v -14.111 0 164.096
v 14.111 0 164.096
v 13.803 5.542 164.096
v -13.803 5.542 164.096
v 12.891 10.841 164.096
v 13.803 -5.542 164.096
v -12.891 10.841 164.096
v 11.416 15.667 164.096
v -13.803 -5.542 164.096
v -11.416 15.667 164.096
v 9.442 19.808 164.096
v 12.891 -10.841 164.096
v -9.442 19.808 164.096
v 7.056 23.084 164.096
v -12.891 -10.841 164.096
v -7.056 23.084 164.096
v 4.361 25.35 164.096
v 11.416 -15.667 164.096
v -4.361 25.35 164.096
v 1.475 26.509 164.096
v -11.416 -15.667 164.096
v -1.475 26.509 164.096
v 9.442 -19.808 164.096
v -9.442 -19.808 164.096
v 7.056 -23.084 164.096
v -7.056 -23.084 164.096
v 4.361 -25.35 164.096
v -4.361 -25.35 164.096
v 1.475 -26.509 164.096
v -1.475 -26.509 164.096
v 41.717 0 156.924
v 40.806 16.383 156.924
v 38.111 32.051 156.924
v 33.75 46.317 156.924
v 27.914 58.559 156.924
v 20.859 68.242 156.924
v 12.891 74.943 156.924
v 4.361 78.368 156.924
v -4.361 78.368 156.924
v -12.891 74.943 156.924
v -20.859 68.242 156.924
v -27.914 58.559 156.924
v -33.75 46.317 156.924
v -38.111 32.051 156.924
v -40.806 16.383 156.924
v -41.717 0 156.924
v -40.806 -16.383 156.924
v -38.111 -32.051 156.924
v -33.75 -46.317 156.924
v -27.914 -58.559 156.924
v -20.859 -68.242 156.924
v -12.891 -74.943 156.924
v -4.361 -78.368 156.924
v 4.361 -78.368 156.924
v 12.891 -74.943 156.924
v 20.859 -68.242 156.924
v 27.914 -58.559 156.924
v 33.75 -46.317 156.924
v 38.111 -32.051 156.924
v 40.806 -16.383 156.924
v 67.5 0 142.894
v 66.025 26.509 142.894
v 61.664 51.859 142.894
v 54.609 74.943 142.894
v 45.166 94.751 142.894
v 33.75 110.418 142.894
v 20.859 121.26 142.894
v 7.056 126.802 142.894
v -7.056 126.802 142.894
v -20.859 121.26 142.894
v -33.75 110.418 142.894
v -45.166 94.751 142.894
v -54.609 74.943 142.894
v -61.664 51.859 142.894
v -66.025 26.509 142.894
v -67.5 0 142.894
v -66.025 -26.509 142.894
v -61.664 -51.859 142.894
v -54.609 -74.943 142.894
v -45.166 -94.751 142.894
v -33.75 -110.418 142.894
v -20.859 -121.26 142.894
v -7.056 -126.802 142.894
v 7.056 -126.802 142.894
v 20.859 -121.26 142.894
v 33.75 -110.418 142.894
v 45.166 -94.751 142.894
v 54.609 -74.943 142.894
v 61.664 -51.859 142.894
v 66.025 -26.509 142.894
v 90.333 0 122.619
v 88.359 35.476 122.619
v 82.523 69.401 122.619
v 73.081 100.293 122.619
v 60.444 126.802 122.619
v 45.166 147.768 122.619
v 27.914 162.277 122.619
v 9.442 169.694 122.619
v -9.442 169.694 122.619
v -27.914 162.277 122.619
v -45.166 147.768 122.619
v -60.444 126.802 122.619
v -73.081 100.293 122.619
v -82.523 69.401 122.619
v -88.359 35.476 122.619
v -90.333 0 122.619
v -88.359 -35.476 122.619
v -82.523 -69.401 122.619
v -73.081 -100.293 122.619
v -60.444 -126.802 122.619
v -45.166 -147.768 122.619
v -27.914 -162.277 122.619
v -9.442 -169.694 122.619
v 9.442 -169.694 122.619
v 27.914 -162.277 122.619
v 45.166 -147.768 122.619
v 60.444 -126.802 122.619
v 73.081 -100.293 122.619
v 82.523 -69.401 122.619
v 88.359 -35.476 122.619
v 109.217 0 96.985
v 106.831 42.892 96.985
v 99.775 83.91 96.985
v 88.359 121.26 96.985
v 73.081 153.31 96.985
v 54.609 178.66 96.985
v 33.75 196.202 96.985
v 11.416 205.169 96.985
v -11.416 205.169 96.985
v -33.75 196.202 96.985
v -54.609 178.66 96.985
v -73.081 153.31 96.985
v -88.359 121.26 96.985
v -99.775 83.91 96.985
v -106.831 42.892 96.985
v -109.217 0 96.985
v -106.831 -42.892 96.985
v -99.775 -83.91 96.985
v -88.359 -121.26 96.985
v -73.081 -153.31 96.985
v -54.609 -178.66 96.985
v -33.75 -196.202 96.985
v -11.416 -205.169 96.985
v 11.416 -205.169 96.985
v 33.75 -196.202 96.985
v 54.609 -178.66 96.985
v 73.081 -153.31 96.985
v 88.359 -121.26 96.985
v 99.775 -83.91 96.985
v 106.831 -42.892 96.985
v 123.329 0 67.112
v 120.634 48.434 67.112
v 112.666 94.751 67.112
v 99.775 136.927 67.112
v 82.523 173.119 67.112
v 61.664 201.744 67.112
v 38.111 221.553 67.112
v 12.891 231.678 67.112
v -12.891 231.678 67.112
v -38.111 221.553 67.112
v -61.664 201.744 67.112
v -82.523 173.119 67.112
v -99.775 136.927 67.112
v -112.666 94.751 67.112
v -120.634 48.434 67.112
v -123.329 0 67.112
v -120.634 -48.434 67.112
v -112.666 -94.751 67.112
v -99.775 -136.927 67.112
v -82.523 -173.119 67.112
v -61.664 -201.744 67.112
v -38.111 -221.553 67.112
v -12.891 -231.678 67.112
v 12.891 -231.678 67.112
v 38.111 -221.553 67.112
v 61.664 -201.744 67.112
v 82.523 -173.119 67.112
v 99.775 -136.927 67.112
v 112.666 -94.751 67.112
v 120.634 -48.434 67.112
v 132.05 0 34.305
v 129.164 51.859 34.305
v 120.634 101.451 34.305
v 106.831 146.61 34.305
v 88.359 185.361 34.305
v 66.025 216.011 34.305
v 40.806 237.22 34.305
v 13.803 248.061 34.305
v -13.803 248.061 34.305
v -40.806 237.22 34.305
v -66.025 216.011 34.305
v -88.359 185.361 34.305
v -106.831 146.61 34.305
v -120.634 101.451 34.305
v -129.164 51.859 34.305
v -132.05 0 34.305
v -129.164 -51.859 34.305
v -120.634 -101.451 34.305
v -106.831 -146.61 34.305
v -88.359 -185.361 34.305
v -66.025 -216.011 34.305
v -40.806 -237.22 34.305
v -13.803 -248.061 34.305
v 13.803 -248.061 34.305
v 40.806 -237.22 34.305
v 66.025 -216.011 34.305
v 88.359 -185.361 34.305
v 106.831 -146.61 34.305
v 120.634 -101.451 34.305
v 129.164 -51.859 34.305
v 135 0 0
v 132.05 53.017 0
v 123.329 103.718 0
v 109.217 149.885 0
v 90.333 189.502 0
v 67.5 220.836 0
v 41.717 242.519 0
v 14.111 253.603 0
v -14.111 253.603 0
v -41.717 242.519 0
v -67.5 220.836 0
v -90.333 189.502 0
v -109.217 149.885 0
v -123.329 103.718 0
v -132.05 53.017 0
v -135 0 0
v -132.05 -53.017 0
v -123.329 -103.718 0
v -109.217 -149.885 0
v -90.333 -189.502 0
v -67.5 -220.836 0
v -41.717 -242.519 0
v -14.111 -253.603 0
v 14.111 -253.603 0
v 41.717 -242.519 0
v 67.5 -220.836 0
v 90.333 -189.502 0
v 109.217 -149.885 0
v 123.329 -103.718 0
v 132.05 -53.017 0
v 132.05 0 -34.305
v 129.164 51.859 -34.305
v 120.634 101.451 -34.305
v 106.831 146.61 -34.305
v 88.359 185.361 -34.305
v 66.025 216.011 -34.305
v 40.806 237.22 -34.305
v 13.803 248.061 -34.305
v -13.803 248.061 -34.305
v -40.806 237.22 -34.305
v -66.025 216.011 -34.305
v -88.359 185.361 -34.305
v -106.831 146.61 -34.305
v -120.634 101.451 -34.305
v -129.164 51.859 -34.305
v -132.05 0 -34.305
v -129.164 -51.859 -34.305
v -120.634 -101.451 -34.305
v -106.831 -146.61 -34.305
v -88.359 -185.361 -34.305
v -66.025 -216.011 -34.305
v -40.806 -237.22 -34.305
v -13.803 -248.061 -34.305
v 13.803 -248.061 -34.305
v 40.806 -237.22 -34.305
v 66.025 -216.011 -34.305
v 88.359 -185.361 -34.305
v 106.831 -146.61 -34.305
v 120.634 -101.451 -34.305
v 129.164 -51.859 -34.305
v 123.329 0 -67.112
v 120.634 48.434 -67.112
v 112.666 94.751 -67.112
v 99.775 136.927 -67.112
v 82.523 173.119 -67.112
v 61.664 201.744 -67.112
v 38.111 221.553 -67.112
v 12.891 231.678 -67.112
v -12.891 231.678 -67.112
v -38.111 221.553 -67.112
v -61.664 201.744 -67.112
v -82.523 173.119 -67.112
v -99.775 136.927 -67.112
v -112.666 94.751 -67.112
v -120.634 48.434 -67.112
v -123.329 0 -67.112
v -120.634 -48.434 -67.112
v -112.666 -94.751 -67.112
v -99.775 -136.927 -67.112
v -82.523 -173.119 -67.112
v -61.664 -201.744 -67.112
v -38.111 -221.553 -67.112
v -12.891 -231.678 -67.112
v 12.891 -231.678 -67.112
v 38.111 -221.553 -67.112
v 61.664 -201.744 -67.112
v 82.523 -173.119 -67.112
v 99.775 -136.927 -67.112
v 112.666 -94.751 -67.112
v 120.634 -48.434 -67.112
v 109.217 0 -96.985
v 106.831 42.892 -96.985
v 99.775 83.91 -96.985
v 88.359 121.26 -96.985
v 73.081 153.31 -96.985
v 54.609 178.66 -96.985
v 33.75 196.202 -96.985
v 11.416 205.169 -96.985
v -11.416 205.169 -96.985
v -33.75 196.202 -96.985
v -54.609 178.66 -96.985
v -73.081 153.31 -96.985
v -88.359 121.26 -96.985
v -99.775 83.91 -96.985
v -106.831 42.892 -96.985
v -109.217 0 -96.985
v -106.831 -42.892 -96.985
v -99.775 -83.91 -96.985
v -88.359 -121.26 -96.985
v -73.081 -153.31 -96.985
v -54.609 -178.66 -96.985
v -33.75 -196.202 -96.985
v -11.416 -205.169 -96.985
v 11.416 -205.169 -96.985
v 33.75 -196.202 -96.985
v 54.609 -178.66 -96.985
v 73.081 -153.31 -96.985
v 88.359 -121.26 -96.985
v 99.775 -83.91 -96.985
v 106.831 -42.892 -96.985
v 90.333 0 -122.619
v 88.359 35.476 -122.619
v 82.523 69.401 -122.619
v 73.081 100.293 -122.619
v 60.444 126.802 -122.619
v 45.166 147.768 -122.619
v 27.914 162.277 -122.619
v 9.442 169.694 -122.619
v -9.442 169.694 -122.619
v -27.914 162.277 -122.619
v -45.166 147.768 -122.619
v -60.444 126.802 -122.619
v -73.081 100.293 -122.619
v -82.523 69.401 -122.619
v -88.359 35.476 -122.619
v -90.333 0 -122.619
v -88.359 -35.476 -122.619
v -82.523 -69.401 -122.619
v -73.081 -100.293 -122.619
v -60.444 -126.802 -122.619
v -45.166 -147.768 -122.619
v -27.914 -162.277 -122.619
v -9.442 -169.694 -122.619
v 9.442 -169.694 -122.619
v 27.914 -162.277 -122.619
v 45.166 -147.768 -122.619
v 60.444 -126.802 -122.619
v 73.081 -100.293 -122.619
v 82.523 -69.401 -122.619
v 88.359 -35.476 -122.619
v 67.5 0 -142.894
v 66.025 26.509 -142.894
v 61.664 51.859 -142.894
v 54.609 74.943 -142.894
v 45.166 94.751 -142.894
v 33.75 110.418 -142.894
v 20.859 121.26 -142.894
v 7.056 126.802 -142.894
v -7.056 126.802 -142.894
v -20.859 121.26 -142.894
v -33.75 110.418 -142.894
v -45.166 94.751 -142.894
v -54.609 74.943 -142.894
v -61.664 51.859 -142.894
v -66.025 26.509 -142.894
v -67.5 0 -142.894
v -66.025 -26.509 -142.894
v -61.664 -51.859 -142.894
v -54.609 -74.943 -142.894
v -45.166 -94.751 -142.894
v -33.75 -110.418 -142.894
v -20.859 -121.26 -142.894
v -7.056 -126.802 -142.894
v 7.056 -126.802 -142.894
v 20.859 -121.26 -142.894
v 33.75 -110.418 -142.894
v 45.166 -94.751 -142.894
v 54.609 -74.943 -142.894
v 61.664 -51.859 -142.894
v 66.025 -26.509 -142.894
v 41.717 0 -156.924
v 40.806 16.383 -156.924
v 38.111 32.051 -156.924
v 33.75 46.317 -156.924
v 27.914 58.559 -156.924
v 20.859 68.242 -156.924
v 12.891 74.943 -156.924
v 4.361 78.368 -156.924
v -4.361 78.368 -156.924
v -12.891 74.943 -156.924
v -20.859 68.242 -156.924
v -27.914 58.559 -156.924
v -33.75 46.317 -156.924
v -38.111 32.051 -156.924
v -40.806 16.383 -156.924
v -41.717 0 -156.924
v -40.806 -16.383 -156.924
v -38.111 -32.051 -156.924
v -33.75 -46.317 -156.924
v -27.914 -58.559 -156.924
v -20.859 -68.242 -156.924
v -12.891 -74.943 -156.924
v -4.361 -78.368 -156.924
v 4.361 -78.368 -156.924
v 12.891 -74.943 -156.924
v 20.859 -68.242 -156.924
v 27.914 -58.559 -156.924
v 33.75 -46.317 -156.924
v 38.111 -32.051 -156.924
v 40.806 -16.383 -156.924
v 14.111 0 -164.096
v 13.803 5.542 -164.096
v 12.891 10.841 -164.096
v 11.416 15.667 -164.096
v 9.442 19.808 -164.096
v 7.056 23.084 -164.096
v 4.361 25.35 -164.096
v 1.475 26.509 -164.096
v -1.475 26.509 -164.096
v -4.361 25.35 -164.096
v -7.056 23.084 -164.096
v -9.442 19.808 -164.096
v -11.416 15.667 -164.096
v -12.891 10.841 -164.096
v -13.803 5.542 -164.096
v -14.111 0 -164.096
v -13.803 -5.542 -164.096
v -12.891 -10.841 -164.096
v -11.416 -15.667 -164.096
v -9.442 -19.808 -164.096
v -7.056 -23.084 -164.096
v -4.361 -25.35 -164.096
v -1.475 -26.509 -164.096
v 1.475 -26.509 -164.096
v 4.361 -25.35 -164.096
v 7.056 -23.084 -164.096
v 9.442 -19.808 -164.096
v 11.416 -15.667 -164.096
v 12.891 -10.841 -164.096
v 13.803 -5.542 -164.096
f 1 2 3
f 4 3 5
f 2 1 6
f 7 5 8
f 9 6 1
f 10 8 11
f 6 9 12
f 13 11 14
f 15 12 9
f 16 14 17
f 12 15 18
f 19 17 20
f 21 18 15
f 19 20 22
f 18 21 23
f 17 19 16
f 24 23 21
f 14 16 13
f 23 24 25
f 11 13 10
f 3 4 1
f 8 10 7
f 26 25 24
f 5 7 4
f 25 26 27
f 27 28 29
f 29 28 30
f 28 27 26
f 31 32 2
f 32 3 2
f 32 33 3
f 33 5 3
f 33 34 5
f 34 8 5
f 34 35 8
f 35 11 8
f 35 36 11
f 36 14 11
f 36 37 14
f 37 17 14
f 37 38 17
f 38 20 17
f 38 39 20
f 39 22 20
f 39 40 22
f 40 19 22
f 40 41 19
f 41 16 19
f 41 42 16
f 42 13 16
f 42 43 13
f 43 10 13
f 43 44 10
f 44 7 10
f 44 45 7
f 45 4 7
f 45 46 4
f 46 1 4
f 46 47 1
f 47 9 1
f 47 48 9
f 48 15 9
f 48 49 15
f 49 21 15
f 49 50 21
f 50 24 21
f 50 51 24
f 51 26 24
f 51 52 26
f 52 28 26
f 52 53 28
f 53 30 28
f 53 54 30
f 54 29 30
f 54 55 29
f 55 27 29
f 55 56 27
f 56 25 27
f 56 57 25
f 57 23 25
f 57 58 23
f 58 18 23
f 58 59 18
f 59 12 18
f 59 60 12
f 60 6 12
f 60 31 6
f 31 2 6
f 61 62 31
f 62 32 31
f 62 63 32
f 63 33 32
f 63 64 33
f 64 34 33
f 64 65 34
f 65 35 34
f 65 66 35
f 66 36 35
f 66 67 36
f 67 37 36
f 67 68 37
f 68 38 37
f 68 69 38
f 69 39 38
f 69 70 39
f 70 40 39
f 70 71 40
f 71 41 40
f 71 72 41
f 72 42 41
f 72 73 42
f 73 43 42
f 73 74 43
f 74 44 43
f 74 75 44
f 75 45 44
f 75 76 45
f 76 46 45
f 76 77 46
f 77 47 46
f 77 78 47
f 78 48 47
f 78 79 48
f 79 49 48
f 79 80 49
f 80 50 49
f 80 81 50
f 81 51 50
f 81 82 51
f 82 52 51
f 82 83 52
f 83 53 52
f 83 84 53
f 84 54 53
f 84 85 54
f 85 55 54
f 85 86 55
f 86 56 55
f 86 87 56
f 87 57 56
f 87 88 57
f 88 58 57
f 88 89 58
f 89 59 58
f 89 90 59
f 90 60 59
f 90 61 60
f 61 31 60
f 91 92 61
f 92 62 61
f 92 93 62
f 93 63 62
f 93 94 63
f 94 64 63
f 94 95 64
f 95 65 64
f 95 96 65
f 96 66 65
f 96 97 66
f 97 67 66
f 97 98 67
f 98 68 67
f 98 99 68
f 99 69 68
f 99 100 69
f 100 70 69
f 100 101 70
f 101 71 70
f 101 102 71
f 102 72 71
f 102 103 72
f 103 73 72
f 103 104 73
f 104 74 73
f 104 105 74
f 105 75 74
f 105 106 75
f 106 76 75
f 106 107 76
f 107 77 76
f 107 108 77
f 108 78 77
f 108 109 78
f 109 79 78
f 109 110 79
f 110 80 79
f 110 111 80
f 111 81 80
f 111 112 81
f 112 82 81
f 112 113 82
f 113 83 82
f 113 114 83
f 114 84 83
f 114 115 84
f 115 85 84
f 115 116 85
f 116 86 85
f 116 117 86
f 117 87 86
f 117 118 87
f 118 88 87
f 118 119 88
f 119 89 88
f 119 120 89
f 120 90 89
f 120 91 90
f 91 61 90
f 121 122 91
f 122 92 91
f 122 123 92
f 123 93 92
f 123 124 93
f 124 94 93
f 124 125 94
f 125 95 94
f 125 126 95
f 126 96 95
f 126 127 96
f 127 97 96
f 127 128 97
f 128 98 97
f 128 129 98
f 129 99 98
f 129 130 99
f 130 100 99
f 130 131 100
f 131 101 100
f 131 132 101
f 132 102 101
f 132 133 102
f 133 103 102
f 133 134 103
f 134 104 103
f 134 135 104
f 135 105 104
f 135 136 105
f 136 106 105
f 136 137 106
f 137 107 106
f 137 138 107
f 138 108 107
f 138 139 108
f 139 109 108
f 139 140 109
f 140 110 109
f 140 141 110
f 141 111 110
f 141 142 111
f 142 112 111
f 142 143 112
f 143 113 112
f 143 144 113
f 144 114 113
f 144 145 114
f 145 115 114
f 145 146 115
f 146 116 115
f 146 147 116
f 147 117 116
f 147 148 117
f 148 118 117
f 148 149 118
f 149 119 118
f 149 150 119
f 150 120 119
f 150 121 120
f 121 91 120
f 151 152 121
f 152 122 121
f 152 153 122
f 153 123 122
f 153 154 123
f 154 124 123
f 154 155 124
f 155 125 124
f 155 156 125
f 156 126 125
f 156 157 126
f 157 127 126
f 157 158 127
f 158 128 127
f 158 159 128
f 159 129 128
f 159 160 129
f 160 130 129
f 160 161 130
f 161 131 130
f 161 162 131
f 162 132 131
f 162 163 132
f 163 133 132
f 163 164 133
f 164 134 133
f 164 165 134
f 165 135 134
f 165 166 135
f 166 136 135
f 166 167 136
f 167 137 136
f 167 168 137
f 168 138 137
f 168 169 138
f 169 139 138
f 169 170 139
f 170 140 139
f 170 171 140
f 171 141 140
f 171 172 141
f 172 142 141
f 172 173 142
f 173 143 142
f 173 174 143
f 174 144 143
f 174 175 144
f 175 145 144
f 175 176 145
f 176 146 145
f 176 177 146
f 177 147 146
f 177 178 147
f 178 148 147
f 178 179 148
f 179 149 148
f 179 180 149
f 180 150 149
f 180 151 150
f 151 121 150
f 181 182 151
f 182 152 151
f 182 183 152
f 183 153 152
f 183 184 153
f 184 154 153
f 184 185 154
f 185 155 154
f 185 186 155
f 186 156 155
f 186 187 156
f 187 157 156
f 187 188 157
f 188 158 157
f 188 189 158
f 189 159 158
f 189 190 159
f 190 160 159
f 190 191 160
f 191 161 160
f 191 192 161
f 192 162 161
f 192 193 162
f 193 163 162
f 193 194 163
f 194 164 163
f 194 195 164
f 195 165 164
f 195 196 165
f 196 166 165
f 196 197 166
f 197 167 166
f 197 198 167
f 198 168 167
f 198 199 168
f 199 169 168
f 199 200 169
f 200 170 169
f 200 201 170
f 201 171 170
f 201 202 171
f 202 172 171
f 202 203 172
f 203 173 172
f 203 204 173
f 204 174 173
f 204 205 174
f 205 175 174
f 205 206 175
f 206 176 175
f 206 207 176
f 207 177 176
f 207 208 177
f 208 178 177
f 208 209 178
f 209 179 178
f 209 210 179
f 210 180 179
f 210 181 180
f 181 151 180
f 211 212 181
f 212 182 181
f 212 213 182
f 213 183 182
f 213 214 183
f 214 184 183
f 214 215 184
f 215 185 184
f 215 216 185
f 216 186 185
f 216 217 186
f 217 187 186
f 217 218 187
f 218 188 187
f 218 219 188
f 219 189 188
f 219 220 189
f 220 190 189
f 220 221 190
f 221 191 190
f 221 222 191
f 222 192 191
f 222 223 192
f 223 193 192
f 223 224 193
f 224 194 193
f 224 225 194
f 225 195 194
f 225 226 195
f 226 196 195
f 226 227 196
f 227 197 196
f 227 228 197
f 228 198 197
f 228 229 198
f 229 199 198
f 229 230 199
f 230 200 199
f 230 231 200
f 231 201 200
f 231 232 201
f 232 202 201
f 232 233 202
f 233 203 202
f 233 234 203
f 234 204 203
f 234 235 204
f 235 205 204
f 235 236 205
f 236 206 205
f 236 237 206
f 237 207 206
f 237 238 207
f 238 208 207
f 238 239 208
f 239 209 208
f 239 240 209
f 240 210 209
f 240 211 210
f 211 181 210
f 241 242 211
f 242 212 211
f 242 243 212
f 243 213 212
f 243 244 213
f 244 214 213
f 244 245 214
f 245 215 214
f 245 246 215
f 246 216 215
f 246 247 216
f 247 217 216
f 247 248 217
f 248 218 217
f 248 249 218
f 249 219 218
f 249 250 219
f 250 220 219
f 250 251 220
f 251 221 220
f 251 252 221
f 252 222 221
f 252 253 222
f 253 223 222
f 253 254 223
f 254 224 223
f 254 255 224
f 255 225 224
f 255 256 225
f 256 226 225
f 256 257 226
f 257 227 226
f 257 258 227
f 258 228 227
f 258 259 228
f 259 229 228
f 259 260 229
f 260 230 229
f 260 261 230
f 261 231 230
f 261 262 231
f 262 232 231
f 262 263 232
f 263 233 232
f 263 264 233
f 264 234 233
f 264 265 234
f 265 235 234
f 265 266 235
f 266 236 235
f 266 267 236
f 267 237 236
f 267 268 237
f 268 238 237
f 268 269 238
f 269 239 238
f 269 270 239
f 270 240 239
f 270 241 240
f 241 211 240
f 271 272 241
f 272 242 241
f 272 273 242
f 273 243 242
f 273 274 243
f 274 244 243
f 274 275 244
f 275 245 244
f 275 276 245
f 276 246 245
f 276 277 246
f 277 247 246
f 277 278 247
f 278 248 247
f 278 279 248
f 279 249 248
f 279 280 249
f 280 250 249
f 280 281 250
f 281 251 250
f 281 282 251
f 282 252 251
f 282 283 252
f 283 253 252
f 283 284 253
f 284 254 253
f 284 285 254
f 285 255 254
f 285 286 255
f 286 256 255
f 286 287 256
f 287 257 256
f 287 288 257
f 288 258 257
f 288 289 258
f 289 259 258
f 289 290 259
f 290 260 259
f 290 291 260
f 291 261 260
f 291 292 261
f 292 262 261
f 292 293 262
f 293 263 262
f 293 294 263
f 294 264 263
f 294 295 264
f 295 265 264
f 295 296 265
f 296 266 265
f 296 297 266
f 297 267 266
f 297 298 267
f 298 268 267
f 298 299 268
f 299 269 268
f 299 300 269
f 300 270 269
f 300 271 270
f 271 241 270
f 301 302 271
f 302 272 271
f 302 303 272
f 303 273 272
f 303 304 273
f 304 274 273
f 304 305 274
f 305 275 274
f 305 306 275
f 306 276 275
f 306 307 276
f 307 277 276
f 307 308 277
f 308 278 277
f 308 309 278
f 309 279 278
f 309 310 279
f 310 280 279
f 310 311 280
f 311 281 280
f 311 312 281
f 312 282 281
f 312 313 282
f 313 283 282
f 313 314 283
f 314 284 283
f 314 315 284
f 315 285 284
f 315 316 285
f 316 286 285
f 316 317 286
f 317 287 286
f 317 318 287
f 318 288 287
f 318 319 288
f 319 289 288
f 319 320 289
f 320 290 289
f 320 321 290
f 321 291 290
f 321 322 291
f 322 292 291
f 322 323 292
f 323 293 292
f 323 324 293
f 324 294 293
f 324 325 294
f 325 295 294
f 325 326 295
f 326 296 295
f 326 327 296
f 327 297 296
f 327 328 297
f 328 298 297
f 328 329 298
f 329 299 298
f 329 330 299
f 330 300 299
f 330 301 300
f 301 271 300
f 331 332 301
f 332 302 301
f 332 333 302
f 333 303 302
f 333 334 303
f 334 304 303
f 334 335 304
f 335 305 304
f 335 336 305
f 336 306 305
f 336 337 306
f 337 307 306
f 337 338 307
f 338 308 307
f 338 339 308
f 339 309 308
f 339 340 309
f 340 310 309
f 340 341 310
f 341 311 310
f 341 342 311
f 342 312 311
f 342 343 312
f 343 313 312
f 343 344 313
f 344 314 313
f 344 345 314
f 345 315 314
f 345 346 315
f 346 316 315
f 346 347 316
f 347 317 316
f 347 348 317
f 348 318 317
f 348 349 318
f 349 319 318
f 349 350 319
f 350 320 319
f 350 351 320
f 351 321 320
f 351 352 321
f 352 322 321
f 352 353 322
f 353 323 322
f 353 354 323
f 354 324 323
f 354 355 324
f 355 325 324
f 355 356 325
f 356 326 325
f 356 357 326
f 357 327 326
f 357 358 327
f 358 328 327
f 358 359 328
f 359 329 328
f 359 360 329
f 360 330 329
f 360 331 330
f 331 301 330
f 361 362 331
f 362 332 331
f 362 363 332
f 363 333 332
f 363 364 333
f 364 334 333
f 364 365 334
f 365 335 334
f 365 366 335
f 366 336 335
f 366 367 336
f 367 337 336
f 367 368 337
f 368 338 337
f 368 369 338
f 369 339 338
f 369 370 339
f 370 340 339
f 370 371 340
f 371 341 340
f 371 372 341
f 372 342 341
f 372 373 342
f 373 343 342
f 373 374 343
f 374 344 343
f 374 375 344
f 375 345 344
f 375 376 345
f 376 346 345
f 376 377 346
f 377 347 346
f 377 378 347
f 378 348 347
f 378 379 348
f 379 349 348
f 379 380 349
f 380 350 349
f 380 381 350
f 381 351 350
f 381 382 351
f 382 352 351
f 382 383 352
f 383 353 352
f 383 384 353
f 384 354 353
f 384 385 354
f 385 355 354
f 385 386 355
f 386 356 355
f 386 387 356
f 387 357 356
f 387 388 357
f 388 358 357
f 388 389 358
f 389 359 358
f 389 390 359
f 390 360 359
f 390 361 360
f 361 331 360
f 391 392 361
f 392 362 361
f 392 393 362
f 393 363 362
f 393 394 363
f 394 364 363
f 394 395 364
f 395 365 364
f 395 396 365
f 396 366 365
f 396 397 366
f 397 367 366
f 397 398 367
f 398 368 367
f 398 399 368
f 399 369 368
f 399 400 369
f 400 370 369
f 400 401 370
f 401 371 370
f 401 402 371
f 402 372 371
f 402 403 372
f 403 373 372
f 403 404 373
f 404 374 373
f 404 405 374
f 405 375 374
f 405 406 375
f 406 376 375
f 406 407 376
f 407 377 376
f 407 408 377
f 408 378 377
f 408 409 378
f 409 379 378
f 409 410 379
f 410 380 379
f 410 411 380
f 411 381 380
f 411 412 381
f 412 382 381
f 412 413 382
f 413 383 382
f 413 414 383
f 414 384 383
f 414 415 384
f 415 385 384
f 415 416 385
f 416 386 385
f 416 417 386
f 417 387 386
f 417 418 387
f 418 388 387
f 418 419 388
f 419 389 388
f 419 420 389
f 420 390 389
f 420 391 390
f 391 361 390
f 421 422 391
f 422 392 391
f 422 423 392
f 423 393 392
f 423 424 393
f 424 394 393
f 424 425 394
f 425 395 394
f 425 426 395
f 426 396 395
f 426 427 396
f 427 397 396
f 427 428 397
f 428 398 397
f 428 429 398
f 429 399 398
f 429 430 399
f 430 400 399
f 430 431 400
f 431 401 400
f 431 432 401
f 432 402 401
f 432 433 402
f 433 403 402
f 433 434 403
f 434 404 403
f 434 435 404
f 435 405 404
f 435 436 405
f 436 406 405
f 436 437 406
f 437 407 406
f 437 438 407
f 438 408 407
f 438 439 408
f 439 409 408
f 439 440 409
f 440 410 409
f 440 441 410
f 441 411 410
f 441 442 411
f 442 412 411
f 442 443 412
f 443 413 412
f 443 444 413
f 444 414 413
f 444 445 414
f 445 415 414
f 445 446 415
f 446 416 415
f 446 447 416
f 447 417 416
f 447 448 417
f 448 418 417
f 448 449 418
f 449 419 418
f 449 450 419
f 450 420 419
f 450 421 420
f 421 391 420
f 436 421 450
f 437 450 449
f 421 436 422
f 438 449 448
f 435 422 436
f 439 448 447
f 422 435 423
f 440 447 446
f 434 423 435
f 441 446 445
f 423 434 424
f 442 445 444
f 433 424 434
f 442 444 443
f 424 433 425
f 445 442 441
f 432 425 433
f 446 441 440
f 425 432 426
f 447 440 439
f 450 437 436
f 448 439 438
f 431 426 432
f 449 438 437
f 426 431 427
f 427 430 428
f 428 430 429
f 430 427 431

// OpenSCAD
// Generated by SolidPython 1.0.1 on 2020-07-29 00:46:49


scale(v = [9, 17, 11]) {
	sphere(r = 15);
}
/***********************************************
*********      SolidPython code:      **********
************************************************
 
# import packages: SolidPython
from solid import *
from solid.utils import *
from itertools import chain, combinations, permutations


class Resize:

    def __init__(self, scad_file):
        self.scad_file = scad_file
        #self.scad_file = import_scad(scad_file)
        # cone/cylinder param:
        self.r1 = 0
        self.r2 = 0
        self.h = 0
        # rectangular prism param:
        self.w = 0
        self.l = 0
        # ellipse param:
        self.r = 0

    # import OpenScad code (file name corresponds to shape)


    # classify shape + parameters
    def assign(self, param1, param2, param3):
        if self.scad_file == 'cone.scad':
            self.r1 = param1
            self.r2 = param2
            self.h = param3
        elif self.scad_file == 'cylinder.scad':
            self.r1 = param1
            self.r2 = param2
            self.h = param3
        elif self.scad_file == 'rectangularPrism.scad':
            self.h = param1
            self.l = param2
            self.w = param3
        else:
            self.r = param1
            self.h = param2

    # resize parameters
    def iterate(self):
        x = range(3, 20, 2)
        i = 1
        if self.scad_file == 'cone.scad':
            tempList = list(permutations(x, 2))
            for temp in tempList:
                param1 = temp[0]
                param2 = temp[1]
                filepath = 'produced_scad_files/' + 'cone' + str(param1) + '_' + str(param2) + '_' + '.scad'
                scad_render_to_file(cylinder(h=param1, r1=param2, r2=0), filepath)

        elif self.scad_file == 'cylinder.scad':
            tempList = list(permutations(x, 3))
            for temp in tempList:
                param1 = temp[0]
                param2 = temp[1]
                filepath = 'produced_scad_files/' + 'cylinder' + str(param1) + '_' + str(param2) + '_' + '.scad'
                scad_render_to_file(cylinder(h=param1, r1=param2, r2=param2), filepath)

        elif self.scad_file == 'rectangularPrism.scad':
            tempList = list(permutations(x, 3))
            for temp in tempList:
                param1 = temp[0]
                param2 = temp[1]
                param3 = temp[2]
                filepath = 'produced_scad_files/' + 'rectangularPrism' + str(param1) + '_' + str(param2) + '_' + str(
                    param3) + '.scad'
                scad_render_to_file(cube(size=(param1, param2, param3)), filepath)

        elif self.scad_file == 'ellipse.scad':
            tempList = list(permutations(x, 4))
            for temp in tempList:
                param1 = temp[0]
                param2 = temp[1]
                param3 = temp[2]
                param4 = temp[3]
                filepath = 'produced_scad_files/' + 'ellipse' + str(param1) + '_' + str(param2) + '_' + str(param3) + '_' + str(param4) + '.scad'
                scad_render_to_file(scale([param1, param2, param3])(sphere(r=param4)), filepath)

    def render_to_scadfile(self):
        scad_render_to_file(scad, 'example.scad') 
 
************************************************/
